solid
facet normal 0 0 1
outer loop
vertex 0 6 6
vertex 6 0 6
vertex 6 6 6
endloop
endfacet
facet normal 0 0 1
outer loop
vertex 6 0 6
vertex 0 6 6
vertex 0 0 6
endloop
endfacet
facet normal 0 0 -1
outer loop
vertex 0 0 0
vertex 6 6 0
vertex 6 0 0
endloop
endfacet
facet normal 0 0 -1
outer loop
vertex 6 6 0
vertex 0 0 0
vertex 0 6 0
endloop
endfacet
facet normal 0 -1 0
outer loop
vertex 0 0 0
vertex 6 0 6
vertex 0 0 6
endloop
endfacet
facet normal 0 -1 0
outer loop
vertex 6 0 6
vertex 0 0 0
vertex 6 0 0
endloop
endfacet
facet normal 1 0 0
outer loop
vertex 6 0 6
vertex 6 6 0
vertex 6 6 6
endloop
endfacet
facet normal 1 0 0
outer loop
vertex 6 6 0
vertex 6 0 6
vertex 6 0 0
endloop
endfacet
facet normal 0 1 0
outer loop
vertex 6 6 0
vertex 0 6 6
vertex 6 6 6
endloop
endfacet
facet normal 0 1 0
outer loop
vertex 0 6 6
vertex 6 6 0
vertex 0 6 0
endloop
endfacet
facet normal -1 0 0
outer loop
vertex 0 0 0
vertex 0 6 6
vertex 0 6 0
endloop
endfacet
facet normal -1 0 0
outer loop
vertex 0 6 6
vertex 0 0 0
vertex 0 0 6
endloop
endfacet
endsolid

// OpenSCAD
// echo(...) and assert(...) as expressions: each performs its step, then
// yields the expression after it.
function checked_size(s) = assert(s > 0, "size must be positive") echo(size = s) s;

side = let(base = 3) checked_size(base * 2);
cube(side);
